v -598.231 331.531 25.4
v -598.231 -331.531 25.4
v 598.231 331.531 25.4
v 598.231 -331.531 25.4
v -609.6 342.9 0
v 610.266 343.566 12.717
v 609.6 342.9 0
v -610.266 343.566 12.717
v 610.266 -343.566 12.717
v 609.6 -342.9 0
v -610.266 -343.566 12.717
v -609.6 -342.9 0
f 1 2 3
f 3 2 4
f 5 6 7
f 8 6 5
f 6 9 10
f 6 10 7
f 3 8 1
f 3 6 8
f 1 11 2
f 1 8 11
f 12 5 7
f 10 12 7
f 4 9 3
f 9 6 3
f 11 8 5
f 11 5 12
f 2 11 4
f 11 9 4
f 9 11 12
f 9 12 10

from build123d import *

# Parameters (mm, degrees)
F0_W     = 1219.2
F0_H     = 685.8
F1_DEPTH = 25.4
F1_TAPER = -3
F2_SIZE  = 12.7


with BuildPart() as f1:
    # F0 (on Top) → F1 (new body)
    with BuildSketch(Plane.XY):
        Rectangle(F0_W, F0_H)
    extrude(amount=F1_DEPTH, taper=F1_TAPER)

    # F2
    f2_edges = [f1.edges().sort_by_distance(p)[0] for p in [
        (610.931158, 0, 25.4),
        (0, 344.231158, 25.4),
        (-610.931158, 0, 25.4),
        (0, -344.231158, 25.4),
    ]]
    chamfer(f2_edges, length=F2_SIZE)


solid = f1.part
